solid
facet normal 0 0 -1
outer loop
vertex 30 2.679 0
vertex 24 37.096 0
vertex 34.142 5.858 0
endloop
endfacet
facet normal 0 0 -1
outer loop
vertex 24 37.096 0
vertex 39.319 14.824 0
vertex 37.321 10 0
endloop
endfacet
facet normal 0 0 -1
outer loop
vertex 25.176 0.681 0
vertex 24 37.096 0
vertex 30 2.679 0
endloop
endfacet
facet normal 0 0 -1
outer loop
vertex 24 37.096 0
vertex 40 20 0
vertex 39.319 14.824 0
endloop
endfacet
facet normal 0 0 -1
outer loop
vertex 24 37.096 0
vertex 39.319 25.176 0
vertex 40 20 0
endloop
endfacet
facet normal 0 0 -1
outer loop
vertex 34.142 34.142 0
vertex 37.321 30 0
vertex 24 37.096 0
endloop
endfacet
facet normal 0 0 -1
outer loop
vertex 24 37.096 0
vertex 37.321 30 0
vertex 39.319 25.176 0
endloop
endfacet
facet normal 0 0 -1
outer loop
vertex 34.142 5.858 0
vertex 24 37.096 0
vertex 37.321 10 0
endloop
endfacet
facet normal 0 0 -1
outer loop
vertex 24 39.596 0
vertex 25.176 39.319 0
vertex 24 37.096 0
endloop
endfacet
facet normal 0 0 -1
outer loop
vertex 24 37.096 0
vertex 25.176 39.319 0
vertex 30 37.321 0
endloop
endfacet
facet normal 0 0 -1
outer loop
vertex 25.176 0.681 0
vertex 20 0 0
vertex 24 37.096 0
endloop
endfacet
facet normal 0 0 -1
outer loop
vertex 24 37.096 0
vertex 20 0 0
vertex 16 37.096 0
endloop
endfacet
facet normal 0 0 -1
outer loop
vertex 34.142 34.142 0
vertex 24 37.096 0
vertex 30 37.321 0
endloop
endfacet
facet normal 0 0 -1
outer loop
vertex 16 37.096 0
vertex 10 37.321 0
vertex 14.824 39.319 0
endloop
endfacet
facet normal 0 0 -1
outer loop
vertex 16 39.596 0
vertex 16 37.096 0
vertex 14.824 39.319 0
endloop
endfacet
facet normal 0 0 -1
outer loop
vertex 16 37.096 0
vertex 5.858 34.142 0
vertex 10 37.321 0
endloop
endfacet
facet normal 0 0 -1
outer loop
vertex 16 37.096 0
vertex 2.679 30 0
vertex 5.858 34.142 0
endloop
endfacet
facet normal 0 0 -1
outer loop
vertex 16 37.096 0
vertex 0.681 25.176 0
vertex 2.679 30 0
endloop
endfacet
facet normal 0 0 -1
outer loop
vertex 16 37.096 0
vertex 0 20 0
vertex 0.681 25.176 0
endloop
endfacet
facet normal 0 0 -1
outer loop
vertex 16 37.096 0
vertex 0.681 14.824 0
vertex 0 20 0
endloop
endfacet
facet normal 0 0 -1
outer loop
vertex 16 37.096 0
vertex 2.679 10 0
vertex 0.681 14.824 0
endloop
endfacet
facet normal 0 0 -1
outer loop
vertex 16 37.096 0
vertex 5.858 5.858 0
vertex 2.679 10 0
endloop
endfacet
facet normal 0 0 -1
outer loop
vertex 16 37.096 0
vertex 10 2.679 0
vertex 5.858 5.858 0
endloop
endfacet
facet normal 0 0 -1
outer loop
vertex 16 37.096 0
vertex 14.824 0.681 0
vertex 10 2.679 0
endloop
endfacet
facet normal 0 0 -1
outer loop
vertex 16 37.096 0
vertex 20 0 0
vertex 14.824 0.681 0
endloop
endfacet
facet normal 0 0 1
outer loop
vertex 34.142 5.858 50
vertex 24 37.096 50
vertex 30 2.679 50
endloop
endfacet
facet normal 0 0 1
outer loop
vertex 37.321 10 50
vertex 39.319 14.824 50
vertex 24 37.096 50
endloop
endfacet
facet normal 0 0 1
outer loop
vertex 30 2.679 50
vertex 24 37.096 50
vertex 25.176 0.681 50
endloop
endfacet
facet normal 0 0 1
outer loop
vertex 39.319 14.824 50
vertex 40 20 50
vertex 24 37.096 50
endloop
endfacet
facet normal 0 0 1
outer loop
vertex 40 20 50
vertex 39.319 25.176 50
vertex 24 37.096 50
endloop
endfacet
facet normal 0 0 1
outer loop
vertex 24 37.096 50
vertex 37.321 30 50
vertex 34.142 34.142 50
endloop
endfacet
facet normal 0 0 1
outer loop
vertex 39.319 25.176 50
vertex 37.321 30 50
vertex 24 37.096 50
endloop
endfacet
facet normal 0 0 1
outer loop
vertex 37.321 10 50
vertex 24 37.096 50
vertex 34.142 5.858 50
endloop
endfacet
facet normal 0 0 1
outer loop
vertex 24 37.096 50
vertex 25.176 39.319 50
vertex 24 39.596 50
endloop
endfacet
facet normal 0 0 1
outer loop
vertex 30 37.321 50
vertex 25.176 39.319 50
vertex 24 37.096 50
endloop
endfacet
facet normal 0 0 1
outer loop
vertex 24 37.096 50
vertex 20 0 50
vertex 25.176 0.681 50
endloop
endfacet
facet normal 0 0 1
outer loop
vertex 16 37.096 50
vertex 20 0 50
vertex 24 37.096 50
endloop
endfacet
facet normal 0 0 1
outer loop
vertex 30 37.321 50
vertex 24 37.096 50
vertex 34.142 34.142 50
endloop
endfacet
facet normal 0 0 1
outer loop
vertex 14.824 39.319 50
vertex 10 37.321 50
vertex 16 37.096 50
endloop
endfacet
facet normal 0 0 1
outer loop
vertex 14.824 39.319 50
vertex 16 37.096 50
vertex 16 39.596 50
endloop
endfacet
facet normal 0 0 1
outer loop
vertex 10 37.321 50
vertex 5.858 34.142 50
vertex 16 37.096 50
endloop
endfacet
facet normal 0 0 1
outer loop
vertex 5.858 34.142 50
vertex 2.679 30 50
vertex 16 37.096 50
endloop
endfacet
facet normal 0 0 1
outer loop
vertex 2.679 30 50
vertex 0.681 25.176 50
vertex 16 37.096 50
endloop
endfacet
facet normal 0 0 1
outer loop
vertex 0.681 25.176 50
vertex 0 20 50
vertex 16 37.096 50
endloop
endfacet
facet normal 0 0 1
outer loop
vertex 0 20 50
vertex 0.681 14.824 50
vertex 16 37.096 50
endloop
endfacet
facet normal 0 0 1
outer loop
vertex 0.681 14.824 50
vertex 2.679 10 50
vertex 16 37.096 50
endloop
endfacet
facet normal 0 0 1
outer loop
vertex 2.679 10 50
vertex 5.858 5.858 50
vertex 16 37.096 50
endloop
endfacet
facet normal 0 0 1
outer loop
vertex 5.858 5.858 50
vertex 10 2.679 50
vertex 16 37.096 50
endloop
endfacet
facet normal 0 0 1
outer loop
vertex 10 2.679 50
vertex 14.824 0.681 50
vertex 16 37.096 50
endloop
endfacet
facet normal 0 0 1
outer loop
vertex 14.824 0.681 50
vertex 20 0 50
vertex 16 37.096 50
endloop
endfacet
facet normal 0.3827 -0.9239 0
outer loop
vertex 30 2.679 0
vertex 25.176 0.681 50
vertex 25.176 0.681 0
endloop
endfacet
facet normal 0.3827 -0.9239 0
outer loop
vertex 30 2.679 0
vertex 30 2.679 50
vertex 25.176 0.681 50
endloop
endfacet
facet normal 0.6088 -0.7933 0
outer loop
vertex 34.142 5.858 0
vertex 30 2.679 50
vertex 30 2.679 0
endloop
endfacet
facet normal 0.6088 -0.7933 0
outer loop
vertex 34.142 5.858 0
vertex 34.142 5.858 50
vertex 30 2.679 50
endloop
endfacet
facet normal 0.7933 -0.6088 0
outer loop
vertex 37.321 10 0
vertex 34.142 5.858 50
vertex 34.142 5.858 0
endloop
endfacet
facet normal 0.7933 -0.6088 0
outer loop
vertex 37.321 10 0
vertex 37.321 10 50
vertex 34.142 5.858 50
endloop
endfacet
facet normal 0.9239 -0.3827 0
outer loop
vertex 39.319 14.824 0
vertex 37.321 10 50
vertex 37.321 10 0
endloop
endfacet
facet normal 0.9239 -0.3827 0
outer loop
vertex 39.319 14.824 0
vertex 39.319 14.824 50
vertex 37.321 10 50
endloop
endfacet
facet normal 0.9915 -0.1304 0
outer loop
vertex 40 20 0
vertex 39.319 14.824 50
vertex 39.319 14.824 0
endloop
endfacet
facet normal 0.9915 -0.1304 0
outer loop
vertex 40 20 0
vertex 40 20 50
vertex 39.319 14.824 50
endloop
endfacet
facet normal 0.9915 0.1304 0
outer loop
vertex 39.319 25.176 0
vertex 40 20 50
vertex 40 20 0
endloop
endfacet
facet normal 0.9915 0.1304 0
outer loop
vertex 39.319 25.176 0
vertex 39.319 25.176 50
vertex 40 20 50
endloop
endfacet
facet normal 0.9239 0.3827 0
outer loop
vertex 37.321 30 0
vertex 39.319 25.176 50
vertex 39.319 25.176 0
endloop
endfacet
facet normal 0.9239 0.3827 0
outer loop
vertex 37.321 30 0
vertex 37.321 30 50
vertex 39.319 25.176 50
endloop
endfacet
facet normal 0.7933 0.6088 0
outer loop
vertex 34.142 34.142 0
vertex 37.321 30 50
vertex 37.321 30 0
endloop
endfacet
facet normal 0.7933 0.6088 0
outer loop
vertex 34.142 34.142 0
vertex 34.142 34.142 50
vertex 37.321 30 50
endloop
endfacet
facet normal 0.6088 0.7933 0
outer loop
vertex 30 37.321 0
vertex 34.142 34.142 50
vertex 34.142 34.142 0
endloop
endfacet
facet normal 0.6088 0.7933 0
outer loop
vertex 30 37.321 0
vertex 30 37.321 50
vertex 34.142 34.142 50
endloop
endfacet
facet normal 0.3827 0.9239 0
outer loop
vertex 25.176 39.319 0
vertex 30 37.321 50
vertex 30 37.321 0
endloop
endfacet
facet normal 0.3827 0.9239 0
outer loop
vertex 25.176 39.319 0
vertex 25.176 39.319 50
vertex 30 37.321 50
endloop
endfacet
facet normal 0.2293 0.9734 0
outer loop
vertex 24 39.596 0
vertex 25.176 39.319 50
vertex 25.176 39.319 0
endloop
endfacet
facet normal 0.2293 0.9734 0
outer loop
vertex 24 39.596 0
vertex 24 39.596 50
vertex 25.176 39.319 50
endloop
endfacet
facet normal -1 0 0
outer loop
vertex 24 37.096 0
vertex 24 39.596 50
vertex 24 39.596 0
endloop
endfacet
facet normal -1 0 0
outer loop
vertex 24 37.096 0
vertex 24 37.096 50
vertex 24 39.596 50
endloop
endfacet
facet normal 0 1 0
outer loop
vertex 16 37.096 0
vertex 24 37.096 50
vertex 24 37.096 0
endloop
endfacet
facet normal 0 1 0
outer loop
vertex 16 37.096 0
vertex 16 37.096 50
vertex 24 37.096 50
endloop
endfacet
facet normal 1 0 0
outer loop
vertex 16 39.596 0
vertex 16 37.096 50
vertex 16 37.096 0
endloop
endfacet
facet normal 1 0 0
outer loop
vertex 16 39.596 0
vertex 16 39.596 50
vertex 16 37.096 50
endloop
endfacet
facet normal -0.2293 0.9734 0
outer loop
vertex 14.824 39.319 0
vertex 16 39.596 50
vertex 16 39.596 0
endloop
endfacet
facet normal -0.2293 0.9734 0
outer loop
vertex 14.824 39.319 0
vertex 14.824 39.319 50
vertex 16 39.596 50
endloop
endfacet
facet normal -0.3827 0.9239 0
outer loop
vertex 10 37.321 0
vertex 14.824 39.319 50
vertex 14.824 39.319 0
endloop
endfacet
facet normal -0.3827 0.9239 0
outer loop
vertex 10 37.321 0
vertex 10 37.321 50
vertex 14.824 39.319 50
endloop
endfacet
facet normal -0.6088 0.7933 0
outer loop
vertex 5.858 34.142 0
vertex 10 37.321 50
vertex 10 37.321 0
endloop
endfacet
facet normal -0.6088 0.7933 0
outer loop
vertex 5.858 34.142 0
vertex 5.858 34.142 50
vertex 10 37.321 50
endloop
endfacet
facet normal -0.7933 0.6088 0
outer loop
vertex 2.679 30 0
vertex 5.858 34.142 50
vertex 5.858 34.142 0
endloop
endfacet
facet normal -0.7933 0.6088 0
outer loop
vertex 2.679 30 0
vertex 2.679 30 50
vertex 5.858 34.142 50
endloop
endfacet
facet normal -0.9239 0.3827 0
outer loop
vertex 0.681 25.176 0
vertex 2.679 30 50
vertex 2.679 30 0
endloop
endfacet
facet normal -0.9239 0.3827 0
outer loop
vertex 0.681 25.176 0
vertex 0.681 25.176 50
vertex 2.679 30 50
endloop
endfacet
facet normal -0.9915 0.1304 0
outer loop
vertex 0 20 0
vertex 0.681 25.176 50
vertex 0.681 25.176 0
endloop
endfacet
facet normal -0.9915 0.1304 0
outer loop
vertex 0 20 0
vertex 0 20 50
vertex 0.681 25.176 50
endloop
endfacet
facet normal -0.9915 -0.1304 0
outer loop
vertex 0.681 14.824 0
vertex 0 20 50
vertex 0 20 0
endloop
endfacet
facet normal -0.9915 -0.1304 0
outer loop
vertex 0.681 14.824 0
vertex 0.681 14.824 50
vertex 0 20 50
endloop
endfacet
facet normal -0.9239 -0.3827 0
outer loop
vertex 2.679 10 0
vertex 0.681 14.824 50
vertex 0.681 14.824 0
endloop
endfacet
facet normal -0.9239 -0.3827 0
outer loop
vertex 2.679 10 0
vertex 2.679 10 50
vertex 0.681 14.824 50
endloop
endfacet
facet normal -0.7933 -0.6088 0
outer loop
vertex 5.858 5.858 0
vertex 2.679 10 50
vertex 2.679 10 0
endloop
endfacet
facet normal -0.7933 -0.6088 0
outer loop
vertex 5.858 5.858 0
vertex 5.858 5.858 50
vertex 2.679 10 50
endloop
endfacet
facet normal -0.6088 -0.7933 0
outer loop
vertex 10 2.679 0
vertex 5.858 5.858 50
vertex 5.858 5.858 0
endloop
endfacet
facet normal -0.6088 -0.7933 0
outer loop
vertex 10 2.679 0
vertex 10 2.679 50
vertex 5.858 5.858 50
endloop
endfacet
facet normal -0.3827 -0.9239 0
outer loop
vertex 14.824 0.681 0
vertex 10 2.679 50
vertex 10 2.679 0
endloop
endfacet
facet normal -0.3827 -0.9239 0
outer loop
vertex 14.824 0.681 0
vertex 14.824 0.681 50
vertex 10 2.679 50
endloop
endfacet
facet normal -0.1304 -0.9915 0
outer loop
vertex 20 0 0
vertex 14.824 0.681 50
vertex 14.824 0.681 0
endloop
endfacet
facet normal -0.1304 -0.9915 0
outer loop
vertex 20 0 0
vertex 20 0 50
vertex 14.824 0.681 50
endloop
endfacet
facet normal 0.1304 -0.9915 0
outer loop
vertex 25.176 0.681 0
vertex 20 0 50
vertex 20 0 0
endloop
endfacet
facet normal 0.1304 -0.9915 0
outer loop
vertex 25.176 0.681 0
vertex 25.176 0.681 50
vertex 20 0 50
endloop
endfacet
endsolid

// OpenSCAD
$fn = 32;

// ----------------------------------------------------------------------
// Keyway shaft: d40 shaft, key 8 x 2.5 mm
// ----------------------------------------------------------------------

// --- parameters (mm) ---
shaft_r = 20;             // shaft radius
key_w = 8;                // keyway width
key_d = 2.5;              // keyway depth below the surface line
plate_t = 50;             // shaft length, Z (extrusion height)

shaft_d = 2 * shaft_r;  // shaft diameter
circle_step = 15;  // polygon sampling step, degrees

profile = [[14.824, 39.319], [10, 37.321], [5.858, 34.142], [2.679, 30], [0.681, 25.176], [0, 20], [0.681, 14.824], [2.679, 10], [5.858, 5.858], [10, 2.679], [14.824, 0.681], [20, 0], [25.176, 0.681], [30, 2.679], [34.142, 5.858], [37.321, 10], [39.319, 14.824], [40, 20], [39.319, 25.176], [37.321, 30], [34.142, 34.142], [30, 37.321], [25.176, 39.319], [24, 39.596], [24, 37.096], [16, 37.096], [16, 39.596]];  // primary outline, 27 points, counter clockwise

// --- the one profile operation ---
linear_extrude(height = plate_t) polygon(points = profile);
